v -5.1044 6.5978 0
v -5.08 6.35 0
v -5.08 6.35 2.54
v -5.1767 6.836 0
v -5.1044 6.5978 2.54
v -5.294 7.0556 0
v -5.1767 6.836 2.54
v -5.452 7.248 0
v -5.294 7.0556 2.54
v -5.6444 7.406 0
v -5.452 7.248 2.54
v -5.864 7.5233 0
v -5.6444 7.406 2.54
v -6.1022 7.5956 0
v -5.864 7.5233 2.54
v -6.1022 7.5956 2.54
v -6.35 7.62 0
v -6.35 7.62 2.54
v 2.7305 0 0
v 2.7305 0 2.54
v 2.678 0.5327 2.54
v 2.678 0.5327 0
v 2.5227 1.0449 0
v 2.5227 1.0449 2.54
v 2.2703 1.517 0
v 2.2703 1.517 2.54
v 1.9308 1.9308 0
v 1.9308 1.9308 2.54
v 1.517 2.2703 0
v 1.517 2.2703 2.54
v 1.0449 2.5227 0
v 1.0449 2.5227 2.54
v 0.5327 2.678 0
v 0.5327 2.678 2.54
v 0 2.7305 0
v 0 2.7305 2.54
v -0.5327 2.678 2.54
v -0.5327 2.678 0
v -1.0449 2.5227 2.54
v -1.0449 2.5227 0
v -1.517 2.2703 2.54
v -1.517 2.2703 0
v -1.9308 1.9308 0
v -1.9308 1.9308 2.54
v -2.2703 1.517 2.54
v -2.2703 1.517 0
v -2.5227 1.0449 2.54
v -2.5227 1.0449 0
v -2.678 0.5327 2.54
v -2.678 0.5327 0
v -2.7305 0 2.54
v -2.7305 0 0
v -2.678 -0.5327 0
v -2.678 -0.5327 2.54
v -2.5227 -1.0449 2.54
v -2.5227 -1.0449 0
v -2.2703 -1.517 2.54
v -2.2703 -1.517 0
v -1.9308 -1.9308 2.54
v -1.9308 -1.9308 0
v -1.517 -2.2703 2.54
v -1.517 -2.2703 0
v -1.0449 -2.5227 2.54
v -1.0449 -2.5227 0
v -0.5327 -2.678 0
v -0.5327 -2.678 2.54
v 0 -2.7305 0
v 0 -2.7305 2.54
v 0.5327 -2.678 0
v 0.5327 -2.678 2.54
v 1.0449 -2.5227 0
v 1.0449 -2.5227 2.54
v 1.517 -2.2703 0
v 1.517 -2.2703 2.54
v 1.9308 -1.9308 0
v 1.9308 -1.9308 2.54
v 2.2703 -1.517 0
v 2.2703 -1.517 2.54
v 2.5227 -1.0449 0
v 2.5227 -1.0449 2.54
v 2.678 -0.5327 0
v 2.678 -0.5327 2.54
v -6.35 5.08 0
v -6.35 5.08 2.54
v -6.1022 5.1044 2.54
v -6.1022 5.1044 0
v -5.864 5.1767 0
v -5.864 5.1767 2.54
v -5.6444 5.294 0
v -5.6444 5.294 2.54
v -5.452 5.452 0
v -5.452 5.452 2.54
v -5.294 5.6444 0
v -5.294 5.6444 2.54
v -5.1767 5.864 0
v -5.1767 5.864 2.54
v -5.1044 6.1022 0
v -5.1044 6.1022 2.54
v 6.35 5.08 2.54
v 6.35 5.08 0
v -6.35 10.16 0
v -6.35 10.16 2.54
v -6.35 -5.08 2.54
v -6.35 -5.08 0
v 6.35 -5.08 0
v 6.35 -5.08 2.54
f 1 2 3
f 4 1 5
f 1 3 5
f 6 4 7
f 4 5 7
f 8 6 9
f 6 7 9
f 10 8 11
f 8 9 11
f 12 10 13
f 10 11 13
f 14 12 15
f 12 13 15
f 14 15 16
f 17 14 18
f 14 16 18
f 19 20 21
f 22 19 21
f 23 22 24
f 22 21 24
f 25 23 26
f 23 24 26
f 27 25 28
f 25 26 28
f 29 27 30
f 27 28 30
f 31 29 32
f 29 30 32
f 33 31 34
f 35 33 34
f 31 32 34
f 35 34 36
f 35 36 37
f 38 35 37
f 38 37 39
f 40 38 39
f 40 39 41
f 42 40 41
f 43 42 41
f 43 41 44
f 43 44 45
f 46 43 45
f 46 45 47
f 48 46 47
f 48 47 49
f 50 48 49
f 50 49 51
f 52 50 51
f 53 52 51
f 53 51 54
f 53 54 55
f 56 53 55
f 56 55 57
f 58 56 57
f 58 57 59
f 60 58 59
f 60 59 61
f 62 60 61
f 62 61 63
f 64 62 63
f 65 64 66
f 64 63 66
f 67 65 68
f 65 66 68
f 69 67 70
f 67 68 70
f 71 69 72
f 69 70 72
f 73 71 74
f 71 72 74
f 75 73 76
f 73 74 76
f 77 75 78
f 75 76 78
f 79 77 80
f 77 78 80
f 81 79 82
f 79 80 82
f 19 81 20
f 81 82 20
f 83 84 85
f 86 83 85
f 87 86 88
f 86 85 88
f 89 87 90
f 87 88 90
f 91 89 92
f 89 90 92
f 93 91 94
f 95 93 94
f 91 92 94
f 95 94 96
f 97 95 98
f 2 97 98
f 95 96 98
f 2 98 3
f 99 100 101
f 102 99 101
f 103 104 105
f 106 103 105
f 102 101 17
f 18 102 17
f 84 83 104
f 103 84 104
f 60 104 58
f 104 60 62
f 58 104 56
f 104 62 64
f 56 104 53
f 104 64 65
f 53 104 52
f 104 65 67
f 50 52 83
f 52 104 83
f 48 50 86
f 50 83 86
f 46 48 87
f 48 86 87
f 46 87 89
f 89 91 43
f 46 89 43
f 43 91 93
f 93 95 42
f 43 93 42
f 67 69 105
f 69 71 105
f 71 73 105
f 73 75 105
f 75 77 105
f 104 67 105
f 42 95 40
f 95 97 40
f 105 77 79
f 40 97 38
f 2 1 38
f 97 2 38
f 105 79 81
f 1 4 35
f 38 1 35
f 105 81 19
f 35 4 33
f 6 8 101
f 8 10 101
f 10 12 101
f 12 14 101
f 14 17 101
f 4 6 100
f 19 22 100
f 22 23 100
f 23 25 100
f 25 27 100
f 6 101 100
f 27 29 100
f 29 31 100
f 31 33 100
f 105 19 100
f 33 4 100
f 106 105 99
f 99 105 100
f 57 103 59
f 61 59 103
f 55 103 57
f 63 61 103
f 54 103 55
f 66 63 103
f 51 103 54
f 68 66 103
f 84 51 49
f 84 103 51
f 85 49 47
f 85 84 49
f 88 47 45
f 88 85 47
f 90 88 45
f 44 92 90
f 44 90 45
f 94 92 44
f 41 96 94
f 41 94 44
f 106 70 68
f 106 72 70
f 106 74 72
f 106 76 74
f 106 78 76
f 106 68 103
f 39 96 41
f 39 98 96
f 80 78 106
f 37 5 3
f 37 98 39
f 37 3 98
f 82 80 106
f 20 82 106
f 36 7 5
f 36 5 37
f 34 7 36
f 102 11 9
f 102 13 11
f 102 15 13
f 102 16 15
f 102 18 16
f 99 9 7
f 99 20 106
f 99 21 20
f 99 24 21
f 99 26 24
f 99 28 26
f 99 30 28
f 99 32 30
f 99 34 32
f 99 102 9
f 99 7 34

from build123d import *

# Parameters (mm, degrees)
F0_W     = 12.7
F0_H     = 10.16
F1_DEPTH = 2.54
F3_DEPTH = 25.4
F4_R     = 2.7305
F5_DEPTH = 25.4


with BuildPart() as f1:
    # F0 (on Top) → F1 (new body)
    with BuildSketch(Plane.XY):
        Rectangle(F0_W, F0_H)
        Polygon((-6.35, 5.08), (6.35, 5.08), (-6.35, 10.16), align=None)
    extrude(amount=F1_DEPTH)

    # F2 (on face) → F3 (cut)
    with BuildSketch(Plane.XY.offset(2.54)):
        with BuildLine():
            ThreePointArc((-6.35, 5.08), (-5.451974, 5.451974), (-5.08, 6.35))
            ThreePointArc((-5.08, 6.35), (-7.248026, 7.248026), (-6.35, 5.08))
        make_face()
    extrude(amount=-F3_DEPTH, mode=Mode.SUBTRACT)

    # F4 (on face) → F5 (cut)
    with BuildSketch(Plane.XY.offset(2.54)):
        Circle(F4_R)
    extrude(amount=-F5_DEPTH, mode=Mode.SUBTRACT)


solid = f1.part
